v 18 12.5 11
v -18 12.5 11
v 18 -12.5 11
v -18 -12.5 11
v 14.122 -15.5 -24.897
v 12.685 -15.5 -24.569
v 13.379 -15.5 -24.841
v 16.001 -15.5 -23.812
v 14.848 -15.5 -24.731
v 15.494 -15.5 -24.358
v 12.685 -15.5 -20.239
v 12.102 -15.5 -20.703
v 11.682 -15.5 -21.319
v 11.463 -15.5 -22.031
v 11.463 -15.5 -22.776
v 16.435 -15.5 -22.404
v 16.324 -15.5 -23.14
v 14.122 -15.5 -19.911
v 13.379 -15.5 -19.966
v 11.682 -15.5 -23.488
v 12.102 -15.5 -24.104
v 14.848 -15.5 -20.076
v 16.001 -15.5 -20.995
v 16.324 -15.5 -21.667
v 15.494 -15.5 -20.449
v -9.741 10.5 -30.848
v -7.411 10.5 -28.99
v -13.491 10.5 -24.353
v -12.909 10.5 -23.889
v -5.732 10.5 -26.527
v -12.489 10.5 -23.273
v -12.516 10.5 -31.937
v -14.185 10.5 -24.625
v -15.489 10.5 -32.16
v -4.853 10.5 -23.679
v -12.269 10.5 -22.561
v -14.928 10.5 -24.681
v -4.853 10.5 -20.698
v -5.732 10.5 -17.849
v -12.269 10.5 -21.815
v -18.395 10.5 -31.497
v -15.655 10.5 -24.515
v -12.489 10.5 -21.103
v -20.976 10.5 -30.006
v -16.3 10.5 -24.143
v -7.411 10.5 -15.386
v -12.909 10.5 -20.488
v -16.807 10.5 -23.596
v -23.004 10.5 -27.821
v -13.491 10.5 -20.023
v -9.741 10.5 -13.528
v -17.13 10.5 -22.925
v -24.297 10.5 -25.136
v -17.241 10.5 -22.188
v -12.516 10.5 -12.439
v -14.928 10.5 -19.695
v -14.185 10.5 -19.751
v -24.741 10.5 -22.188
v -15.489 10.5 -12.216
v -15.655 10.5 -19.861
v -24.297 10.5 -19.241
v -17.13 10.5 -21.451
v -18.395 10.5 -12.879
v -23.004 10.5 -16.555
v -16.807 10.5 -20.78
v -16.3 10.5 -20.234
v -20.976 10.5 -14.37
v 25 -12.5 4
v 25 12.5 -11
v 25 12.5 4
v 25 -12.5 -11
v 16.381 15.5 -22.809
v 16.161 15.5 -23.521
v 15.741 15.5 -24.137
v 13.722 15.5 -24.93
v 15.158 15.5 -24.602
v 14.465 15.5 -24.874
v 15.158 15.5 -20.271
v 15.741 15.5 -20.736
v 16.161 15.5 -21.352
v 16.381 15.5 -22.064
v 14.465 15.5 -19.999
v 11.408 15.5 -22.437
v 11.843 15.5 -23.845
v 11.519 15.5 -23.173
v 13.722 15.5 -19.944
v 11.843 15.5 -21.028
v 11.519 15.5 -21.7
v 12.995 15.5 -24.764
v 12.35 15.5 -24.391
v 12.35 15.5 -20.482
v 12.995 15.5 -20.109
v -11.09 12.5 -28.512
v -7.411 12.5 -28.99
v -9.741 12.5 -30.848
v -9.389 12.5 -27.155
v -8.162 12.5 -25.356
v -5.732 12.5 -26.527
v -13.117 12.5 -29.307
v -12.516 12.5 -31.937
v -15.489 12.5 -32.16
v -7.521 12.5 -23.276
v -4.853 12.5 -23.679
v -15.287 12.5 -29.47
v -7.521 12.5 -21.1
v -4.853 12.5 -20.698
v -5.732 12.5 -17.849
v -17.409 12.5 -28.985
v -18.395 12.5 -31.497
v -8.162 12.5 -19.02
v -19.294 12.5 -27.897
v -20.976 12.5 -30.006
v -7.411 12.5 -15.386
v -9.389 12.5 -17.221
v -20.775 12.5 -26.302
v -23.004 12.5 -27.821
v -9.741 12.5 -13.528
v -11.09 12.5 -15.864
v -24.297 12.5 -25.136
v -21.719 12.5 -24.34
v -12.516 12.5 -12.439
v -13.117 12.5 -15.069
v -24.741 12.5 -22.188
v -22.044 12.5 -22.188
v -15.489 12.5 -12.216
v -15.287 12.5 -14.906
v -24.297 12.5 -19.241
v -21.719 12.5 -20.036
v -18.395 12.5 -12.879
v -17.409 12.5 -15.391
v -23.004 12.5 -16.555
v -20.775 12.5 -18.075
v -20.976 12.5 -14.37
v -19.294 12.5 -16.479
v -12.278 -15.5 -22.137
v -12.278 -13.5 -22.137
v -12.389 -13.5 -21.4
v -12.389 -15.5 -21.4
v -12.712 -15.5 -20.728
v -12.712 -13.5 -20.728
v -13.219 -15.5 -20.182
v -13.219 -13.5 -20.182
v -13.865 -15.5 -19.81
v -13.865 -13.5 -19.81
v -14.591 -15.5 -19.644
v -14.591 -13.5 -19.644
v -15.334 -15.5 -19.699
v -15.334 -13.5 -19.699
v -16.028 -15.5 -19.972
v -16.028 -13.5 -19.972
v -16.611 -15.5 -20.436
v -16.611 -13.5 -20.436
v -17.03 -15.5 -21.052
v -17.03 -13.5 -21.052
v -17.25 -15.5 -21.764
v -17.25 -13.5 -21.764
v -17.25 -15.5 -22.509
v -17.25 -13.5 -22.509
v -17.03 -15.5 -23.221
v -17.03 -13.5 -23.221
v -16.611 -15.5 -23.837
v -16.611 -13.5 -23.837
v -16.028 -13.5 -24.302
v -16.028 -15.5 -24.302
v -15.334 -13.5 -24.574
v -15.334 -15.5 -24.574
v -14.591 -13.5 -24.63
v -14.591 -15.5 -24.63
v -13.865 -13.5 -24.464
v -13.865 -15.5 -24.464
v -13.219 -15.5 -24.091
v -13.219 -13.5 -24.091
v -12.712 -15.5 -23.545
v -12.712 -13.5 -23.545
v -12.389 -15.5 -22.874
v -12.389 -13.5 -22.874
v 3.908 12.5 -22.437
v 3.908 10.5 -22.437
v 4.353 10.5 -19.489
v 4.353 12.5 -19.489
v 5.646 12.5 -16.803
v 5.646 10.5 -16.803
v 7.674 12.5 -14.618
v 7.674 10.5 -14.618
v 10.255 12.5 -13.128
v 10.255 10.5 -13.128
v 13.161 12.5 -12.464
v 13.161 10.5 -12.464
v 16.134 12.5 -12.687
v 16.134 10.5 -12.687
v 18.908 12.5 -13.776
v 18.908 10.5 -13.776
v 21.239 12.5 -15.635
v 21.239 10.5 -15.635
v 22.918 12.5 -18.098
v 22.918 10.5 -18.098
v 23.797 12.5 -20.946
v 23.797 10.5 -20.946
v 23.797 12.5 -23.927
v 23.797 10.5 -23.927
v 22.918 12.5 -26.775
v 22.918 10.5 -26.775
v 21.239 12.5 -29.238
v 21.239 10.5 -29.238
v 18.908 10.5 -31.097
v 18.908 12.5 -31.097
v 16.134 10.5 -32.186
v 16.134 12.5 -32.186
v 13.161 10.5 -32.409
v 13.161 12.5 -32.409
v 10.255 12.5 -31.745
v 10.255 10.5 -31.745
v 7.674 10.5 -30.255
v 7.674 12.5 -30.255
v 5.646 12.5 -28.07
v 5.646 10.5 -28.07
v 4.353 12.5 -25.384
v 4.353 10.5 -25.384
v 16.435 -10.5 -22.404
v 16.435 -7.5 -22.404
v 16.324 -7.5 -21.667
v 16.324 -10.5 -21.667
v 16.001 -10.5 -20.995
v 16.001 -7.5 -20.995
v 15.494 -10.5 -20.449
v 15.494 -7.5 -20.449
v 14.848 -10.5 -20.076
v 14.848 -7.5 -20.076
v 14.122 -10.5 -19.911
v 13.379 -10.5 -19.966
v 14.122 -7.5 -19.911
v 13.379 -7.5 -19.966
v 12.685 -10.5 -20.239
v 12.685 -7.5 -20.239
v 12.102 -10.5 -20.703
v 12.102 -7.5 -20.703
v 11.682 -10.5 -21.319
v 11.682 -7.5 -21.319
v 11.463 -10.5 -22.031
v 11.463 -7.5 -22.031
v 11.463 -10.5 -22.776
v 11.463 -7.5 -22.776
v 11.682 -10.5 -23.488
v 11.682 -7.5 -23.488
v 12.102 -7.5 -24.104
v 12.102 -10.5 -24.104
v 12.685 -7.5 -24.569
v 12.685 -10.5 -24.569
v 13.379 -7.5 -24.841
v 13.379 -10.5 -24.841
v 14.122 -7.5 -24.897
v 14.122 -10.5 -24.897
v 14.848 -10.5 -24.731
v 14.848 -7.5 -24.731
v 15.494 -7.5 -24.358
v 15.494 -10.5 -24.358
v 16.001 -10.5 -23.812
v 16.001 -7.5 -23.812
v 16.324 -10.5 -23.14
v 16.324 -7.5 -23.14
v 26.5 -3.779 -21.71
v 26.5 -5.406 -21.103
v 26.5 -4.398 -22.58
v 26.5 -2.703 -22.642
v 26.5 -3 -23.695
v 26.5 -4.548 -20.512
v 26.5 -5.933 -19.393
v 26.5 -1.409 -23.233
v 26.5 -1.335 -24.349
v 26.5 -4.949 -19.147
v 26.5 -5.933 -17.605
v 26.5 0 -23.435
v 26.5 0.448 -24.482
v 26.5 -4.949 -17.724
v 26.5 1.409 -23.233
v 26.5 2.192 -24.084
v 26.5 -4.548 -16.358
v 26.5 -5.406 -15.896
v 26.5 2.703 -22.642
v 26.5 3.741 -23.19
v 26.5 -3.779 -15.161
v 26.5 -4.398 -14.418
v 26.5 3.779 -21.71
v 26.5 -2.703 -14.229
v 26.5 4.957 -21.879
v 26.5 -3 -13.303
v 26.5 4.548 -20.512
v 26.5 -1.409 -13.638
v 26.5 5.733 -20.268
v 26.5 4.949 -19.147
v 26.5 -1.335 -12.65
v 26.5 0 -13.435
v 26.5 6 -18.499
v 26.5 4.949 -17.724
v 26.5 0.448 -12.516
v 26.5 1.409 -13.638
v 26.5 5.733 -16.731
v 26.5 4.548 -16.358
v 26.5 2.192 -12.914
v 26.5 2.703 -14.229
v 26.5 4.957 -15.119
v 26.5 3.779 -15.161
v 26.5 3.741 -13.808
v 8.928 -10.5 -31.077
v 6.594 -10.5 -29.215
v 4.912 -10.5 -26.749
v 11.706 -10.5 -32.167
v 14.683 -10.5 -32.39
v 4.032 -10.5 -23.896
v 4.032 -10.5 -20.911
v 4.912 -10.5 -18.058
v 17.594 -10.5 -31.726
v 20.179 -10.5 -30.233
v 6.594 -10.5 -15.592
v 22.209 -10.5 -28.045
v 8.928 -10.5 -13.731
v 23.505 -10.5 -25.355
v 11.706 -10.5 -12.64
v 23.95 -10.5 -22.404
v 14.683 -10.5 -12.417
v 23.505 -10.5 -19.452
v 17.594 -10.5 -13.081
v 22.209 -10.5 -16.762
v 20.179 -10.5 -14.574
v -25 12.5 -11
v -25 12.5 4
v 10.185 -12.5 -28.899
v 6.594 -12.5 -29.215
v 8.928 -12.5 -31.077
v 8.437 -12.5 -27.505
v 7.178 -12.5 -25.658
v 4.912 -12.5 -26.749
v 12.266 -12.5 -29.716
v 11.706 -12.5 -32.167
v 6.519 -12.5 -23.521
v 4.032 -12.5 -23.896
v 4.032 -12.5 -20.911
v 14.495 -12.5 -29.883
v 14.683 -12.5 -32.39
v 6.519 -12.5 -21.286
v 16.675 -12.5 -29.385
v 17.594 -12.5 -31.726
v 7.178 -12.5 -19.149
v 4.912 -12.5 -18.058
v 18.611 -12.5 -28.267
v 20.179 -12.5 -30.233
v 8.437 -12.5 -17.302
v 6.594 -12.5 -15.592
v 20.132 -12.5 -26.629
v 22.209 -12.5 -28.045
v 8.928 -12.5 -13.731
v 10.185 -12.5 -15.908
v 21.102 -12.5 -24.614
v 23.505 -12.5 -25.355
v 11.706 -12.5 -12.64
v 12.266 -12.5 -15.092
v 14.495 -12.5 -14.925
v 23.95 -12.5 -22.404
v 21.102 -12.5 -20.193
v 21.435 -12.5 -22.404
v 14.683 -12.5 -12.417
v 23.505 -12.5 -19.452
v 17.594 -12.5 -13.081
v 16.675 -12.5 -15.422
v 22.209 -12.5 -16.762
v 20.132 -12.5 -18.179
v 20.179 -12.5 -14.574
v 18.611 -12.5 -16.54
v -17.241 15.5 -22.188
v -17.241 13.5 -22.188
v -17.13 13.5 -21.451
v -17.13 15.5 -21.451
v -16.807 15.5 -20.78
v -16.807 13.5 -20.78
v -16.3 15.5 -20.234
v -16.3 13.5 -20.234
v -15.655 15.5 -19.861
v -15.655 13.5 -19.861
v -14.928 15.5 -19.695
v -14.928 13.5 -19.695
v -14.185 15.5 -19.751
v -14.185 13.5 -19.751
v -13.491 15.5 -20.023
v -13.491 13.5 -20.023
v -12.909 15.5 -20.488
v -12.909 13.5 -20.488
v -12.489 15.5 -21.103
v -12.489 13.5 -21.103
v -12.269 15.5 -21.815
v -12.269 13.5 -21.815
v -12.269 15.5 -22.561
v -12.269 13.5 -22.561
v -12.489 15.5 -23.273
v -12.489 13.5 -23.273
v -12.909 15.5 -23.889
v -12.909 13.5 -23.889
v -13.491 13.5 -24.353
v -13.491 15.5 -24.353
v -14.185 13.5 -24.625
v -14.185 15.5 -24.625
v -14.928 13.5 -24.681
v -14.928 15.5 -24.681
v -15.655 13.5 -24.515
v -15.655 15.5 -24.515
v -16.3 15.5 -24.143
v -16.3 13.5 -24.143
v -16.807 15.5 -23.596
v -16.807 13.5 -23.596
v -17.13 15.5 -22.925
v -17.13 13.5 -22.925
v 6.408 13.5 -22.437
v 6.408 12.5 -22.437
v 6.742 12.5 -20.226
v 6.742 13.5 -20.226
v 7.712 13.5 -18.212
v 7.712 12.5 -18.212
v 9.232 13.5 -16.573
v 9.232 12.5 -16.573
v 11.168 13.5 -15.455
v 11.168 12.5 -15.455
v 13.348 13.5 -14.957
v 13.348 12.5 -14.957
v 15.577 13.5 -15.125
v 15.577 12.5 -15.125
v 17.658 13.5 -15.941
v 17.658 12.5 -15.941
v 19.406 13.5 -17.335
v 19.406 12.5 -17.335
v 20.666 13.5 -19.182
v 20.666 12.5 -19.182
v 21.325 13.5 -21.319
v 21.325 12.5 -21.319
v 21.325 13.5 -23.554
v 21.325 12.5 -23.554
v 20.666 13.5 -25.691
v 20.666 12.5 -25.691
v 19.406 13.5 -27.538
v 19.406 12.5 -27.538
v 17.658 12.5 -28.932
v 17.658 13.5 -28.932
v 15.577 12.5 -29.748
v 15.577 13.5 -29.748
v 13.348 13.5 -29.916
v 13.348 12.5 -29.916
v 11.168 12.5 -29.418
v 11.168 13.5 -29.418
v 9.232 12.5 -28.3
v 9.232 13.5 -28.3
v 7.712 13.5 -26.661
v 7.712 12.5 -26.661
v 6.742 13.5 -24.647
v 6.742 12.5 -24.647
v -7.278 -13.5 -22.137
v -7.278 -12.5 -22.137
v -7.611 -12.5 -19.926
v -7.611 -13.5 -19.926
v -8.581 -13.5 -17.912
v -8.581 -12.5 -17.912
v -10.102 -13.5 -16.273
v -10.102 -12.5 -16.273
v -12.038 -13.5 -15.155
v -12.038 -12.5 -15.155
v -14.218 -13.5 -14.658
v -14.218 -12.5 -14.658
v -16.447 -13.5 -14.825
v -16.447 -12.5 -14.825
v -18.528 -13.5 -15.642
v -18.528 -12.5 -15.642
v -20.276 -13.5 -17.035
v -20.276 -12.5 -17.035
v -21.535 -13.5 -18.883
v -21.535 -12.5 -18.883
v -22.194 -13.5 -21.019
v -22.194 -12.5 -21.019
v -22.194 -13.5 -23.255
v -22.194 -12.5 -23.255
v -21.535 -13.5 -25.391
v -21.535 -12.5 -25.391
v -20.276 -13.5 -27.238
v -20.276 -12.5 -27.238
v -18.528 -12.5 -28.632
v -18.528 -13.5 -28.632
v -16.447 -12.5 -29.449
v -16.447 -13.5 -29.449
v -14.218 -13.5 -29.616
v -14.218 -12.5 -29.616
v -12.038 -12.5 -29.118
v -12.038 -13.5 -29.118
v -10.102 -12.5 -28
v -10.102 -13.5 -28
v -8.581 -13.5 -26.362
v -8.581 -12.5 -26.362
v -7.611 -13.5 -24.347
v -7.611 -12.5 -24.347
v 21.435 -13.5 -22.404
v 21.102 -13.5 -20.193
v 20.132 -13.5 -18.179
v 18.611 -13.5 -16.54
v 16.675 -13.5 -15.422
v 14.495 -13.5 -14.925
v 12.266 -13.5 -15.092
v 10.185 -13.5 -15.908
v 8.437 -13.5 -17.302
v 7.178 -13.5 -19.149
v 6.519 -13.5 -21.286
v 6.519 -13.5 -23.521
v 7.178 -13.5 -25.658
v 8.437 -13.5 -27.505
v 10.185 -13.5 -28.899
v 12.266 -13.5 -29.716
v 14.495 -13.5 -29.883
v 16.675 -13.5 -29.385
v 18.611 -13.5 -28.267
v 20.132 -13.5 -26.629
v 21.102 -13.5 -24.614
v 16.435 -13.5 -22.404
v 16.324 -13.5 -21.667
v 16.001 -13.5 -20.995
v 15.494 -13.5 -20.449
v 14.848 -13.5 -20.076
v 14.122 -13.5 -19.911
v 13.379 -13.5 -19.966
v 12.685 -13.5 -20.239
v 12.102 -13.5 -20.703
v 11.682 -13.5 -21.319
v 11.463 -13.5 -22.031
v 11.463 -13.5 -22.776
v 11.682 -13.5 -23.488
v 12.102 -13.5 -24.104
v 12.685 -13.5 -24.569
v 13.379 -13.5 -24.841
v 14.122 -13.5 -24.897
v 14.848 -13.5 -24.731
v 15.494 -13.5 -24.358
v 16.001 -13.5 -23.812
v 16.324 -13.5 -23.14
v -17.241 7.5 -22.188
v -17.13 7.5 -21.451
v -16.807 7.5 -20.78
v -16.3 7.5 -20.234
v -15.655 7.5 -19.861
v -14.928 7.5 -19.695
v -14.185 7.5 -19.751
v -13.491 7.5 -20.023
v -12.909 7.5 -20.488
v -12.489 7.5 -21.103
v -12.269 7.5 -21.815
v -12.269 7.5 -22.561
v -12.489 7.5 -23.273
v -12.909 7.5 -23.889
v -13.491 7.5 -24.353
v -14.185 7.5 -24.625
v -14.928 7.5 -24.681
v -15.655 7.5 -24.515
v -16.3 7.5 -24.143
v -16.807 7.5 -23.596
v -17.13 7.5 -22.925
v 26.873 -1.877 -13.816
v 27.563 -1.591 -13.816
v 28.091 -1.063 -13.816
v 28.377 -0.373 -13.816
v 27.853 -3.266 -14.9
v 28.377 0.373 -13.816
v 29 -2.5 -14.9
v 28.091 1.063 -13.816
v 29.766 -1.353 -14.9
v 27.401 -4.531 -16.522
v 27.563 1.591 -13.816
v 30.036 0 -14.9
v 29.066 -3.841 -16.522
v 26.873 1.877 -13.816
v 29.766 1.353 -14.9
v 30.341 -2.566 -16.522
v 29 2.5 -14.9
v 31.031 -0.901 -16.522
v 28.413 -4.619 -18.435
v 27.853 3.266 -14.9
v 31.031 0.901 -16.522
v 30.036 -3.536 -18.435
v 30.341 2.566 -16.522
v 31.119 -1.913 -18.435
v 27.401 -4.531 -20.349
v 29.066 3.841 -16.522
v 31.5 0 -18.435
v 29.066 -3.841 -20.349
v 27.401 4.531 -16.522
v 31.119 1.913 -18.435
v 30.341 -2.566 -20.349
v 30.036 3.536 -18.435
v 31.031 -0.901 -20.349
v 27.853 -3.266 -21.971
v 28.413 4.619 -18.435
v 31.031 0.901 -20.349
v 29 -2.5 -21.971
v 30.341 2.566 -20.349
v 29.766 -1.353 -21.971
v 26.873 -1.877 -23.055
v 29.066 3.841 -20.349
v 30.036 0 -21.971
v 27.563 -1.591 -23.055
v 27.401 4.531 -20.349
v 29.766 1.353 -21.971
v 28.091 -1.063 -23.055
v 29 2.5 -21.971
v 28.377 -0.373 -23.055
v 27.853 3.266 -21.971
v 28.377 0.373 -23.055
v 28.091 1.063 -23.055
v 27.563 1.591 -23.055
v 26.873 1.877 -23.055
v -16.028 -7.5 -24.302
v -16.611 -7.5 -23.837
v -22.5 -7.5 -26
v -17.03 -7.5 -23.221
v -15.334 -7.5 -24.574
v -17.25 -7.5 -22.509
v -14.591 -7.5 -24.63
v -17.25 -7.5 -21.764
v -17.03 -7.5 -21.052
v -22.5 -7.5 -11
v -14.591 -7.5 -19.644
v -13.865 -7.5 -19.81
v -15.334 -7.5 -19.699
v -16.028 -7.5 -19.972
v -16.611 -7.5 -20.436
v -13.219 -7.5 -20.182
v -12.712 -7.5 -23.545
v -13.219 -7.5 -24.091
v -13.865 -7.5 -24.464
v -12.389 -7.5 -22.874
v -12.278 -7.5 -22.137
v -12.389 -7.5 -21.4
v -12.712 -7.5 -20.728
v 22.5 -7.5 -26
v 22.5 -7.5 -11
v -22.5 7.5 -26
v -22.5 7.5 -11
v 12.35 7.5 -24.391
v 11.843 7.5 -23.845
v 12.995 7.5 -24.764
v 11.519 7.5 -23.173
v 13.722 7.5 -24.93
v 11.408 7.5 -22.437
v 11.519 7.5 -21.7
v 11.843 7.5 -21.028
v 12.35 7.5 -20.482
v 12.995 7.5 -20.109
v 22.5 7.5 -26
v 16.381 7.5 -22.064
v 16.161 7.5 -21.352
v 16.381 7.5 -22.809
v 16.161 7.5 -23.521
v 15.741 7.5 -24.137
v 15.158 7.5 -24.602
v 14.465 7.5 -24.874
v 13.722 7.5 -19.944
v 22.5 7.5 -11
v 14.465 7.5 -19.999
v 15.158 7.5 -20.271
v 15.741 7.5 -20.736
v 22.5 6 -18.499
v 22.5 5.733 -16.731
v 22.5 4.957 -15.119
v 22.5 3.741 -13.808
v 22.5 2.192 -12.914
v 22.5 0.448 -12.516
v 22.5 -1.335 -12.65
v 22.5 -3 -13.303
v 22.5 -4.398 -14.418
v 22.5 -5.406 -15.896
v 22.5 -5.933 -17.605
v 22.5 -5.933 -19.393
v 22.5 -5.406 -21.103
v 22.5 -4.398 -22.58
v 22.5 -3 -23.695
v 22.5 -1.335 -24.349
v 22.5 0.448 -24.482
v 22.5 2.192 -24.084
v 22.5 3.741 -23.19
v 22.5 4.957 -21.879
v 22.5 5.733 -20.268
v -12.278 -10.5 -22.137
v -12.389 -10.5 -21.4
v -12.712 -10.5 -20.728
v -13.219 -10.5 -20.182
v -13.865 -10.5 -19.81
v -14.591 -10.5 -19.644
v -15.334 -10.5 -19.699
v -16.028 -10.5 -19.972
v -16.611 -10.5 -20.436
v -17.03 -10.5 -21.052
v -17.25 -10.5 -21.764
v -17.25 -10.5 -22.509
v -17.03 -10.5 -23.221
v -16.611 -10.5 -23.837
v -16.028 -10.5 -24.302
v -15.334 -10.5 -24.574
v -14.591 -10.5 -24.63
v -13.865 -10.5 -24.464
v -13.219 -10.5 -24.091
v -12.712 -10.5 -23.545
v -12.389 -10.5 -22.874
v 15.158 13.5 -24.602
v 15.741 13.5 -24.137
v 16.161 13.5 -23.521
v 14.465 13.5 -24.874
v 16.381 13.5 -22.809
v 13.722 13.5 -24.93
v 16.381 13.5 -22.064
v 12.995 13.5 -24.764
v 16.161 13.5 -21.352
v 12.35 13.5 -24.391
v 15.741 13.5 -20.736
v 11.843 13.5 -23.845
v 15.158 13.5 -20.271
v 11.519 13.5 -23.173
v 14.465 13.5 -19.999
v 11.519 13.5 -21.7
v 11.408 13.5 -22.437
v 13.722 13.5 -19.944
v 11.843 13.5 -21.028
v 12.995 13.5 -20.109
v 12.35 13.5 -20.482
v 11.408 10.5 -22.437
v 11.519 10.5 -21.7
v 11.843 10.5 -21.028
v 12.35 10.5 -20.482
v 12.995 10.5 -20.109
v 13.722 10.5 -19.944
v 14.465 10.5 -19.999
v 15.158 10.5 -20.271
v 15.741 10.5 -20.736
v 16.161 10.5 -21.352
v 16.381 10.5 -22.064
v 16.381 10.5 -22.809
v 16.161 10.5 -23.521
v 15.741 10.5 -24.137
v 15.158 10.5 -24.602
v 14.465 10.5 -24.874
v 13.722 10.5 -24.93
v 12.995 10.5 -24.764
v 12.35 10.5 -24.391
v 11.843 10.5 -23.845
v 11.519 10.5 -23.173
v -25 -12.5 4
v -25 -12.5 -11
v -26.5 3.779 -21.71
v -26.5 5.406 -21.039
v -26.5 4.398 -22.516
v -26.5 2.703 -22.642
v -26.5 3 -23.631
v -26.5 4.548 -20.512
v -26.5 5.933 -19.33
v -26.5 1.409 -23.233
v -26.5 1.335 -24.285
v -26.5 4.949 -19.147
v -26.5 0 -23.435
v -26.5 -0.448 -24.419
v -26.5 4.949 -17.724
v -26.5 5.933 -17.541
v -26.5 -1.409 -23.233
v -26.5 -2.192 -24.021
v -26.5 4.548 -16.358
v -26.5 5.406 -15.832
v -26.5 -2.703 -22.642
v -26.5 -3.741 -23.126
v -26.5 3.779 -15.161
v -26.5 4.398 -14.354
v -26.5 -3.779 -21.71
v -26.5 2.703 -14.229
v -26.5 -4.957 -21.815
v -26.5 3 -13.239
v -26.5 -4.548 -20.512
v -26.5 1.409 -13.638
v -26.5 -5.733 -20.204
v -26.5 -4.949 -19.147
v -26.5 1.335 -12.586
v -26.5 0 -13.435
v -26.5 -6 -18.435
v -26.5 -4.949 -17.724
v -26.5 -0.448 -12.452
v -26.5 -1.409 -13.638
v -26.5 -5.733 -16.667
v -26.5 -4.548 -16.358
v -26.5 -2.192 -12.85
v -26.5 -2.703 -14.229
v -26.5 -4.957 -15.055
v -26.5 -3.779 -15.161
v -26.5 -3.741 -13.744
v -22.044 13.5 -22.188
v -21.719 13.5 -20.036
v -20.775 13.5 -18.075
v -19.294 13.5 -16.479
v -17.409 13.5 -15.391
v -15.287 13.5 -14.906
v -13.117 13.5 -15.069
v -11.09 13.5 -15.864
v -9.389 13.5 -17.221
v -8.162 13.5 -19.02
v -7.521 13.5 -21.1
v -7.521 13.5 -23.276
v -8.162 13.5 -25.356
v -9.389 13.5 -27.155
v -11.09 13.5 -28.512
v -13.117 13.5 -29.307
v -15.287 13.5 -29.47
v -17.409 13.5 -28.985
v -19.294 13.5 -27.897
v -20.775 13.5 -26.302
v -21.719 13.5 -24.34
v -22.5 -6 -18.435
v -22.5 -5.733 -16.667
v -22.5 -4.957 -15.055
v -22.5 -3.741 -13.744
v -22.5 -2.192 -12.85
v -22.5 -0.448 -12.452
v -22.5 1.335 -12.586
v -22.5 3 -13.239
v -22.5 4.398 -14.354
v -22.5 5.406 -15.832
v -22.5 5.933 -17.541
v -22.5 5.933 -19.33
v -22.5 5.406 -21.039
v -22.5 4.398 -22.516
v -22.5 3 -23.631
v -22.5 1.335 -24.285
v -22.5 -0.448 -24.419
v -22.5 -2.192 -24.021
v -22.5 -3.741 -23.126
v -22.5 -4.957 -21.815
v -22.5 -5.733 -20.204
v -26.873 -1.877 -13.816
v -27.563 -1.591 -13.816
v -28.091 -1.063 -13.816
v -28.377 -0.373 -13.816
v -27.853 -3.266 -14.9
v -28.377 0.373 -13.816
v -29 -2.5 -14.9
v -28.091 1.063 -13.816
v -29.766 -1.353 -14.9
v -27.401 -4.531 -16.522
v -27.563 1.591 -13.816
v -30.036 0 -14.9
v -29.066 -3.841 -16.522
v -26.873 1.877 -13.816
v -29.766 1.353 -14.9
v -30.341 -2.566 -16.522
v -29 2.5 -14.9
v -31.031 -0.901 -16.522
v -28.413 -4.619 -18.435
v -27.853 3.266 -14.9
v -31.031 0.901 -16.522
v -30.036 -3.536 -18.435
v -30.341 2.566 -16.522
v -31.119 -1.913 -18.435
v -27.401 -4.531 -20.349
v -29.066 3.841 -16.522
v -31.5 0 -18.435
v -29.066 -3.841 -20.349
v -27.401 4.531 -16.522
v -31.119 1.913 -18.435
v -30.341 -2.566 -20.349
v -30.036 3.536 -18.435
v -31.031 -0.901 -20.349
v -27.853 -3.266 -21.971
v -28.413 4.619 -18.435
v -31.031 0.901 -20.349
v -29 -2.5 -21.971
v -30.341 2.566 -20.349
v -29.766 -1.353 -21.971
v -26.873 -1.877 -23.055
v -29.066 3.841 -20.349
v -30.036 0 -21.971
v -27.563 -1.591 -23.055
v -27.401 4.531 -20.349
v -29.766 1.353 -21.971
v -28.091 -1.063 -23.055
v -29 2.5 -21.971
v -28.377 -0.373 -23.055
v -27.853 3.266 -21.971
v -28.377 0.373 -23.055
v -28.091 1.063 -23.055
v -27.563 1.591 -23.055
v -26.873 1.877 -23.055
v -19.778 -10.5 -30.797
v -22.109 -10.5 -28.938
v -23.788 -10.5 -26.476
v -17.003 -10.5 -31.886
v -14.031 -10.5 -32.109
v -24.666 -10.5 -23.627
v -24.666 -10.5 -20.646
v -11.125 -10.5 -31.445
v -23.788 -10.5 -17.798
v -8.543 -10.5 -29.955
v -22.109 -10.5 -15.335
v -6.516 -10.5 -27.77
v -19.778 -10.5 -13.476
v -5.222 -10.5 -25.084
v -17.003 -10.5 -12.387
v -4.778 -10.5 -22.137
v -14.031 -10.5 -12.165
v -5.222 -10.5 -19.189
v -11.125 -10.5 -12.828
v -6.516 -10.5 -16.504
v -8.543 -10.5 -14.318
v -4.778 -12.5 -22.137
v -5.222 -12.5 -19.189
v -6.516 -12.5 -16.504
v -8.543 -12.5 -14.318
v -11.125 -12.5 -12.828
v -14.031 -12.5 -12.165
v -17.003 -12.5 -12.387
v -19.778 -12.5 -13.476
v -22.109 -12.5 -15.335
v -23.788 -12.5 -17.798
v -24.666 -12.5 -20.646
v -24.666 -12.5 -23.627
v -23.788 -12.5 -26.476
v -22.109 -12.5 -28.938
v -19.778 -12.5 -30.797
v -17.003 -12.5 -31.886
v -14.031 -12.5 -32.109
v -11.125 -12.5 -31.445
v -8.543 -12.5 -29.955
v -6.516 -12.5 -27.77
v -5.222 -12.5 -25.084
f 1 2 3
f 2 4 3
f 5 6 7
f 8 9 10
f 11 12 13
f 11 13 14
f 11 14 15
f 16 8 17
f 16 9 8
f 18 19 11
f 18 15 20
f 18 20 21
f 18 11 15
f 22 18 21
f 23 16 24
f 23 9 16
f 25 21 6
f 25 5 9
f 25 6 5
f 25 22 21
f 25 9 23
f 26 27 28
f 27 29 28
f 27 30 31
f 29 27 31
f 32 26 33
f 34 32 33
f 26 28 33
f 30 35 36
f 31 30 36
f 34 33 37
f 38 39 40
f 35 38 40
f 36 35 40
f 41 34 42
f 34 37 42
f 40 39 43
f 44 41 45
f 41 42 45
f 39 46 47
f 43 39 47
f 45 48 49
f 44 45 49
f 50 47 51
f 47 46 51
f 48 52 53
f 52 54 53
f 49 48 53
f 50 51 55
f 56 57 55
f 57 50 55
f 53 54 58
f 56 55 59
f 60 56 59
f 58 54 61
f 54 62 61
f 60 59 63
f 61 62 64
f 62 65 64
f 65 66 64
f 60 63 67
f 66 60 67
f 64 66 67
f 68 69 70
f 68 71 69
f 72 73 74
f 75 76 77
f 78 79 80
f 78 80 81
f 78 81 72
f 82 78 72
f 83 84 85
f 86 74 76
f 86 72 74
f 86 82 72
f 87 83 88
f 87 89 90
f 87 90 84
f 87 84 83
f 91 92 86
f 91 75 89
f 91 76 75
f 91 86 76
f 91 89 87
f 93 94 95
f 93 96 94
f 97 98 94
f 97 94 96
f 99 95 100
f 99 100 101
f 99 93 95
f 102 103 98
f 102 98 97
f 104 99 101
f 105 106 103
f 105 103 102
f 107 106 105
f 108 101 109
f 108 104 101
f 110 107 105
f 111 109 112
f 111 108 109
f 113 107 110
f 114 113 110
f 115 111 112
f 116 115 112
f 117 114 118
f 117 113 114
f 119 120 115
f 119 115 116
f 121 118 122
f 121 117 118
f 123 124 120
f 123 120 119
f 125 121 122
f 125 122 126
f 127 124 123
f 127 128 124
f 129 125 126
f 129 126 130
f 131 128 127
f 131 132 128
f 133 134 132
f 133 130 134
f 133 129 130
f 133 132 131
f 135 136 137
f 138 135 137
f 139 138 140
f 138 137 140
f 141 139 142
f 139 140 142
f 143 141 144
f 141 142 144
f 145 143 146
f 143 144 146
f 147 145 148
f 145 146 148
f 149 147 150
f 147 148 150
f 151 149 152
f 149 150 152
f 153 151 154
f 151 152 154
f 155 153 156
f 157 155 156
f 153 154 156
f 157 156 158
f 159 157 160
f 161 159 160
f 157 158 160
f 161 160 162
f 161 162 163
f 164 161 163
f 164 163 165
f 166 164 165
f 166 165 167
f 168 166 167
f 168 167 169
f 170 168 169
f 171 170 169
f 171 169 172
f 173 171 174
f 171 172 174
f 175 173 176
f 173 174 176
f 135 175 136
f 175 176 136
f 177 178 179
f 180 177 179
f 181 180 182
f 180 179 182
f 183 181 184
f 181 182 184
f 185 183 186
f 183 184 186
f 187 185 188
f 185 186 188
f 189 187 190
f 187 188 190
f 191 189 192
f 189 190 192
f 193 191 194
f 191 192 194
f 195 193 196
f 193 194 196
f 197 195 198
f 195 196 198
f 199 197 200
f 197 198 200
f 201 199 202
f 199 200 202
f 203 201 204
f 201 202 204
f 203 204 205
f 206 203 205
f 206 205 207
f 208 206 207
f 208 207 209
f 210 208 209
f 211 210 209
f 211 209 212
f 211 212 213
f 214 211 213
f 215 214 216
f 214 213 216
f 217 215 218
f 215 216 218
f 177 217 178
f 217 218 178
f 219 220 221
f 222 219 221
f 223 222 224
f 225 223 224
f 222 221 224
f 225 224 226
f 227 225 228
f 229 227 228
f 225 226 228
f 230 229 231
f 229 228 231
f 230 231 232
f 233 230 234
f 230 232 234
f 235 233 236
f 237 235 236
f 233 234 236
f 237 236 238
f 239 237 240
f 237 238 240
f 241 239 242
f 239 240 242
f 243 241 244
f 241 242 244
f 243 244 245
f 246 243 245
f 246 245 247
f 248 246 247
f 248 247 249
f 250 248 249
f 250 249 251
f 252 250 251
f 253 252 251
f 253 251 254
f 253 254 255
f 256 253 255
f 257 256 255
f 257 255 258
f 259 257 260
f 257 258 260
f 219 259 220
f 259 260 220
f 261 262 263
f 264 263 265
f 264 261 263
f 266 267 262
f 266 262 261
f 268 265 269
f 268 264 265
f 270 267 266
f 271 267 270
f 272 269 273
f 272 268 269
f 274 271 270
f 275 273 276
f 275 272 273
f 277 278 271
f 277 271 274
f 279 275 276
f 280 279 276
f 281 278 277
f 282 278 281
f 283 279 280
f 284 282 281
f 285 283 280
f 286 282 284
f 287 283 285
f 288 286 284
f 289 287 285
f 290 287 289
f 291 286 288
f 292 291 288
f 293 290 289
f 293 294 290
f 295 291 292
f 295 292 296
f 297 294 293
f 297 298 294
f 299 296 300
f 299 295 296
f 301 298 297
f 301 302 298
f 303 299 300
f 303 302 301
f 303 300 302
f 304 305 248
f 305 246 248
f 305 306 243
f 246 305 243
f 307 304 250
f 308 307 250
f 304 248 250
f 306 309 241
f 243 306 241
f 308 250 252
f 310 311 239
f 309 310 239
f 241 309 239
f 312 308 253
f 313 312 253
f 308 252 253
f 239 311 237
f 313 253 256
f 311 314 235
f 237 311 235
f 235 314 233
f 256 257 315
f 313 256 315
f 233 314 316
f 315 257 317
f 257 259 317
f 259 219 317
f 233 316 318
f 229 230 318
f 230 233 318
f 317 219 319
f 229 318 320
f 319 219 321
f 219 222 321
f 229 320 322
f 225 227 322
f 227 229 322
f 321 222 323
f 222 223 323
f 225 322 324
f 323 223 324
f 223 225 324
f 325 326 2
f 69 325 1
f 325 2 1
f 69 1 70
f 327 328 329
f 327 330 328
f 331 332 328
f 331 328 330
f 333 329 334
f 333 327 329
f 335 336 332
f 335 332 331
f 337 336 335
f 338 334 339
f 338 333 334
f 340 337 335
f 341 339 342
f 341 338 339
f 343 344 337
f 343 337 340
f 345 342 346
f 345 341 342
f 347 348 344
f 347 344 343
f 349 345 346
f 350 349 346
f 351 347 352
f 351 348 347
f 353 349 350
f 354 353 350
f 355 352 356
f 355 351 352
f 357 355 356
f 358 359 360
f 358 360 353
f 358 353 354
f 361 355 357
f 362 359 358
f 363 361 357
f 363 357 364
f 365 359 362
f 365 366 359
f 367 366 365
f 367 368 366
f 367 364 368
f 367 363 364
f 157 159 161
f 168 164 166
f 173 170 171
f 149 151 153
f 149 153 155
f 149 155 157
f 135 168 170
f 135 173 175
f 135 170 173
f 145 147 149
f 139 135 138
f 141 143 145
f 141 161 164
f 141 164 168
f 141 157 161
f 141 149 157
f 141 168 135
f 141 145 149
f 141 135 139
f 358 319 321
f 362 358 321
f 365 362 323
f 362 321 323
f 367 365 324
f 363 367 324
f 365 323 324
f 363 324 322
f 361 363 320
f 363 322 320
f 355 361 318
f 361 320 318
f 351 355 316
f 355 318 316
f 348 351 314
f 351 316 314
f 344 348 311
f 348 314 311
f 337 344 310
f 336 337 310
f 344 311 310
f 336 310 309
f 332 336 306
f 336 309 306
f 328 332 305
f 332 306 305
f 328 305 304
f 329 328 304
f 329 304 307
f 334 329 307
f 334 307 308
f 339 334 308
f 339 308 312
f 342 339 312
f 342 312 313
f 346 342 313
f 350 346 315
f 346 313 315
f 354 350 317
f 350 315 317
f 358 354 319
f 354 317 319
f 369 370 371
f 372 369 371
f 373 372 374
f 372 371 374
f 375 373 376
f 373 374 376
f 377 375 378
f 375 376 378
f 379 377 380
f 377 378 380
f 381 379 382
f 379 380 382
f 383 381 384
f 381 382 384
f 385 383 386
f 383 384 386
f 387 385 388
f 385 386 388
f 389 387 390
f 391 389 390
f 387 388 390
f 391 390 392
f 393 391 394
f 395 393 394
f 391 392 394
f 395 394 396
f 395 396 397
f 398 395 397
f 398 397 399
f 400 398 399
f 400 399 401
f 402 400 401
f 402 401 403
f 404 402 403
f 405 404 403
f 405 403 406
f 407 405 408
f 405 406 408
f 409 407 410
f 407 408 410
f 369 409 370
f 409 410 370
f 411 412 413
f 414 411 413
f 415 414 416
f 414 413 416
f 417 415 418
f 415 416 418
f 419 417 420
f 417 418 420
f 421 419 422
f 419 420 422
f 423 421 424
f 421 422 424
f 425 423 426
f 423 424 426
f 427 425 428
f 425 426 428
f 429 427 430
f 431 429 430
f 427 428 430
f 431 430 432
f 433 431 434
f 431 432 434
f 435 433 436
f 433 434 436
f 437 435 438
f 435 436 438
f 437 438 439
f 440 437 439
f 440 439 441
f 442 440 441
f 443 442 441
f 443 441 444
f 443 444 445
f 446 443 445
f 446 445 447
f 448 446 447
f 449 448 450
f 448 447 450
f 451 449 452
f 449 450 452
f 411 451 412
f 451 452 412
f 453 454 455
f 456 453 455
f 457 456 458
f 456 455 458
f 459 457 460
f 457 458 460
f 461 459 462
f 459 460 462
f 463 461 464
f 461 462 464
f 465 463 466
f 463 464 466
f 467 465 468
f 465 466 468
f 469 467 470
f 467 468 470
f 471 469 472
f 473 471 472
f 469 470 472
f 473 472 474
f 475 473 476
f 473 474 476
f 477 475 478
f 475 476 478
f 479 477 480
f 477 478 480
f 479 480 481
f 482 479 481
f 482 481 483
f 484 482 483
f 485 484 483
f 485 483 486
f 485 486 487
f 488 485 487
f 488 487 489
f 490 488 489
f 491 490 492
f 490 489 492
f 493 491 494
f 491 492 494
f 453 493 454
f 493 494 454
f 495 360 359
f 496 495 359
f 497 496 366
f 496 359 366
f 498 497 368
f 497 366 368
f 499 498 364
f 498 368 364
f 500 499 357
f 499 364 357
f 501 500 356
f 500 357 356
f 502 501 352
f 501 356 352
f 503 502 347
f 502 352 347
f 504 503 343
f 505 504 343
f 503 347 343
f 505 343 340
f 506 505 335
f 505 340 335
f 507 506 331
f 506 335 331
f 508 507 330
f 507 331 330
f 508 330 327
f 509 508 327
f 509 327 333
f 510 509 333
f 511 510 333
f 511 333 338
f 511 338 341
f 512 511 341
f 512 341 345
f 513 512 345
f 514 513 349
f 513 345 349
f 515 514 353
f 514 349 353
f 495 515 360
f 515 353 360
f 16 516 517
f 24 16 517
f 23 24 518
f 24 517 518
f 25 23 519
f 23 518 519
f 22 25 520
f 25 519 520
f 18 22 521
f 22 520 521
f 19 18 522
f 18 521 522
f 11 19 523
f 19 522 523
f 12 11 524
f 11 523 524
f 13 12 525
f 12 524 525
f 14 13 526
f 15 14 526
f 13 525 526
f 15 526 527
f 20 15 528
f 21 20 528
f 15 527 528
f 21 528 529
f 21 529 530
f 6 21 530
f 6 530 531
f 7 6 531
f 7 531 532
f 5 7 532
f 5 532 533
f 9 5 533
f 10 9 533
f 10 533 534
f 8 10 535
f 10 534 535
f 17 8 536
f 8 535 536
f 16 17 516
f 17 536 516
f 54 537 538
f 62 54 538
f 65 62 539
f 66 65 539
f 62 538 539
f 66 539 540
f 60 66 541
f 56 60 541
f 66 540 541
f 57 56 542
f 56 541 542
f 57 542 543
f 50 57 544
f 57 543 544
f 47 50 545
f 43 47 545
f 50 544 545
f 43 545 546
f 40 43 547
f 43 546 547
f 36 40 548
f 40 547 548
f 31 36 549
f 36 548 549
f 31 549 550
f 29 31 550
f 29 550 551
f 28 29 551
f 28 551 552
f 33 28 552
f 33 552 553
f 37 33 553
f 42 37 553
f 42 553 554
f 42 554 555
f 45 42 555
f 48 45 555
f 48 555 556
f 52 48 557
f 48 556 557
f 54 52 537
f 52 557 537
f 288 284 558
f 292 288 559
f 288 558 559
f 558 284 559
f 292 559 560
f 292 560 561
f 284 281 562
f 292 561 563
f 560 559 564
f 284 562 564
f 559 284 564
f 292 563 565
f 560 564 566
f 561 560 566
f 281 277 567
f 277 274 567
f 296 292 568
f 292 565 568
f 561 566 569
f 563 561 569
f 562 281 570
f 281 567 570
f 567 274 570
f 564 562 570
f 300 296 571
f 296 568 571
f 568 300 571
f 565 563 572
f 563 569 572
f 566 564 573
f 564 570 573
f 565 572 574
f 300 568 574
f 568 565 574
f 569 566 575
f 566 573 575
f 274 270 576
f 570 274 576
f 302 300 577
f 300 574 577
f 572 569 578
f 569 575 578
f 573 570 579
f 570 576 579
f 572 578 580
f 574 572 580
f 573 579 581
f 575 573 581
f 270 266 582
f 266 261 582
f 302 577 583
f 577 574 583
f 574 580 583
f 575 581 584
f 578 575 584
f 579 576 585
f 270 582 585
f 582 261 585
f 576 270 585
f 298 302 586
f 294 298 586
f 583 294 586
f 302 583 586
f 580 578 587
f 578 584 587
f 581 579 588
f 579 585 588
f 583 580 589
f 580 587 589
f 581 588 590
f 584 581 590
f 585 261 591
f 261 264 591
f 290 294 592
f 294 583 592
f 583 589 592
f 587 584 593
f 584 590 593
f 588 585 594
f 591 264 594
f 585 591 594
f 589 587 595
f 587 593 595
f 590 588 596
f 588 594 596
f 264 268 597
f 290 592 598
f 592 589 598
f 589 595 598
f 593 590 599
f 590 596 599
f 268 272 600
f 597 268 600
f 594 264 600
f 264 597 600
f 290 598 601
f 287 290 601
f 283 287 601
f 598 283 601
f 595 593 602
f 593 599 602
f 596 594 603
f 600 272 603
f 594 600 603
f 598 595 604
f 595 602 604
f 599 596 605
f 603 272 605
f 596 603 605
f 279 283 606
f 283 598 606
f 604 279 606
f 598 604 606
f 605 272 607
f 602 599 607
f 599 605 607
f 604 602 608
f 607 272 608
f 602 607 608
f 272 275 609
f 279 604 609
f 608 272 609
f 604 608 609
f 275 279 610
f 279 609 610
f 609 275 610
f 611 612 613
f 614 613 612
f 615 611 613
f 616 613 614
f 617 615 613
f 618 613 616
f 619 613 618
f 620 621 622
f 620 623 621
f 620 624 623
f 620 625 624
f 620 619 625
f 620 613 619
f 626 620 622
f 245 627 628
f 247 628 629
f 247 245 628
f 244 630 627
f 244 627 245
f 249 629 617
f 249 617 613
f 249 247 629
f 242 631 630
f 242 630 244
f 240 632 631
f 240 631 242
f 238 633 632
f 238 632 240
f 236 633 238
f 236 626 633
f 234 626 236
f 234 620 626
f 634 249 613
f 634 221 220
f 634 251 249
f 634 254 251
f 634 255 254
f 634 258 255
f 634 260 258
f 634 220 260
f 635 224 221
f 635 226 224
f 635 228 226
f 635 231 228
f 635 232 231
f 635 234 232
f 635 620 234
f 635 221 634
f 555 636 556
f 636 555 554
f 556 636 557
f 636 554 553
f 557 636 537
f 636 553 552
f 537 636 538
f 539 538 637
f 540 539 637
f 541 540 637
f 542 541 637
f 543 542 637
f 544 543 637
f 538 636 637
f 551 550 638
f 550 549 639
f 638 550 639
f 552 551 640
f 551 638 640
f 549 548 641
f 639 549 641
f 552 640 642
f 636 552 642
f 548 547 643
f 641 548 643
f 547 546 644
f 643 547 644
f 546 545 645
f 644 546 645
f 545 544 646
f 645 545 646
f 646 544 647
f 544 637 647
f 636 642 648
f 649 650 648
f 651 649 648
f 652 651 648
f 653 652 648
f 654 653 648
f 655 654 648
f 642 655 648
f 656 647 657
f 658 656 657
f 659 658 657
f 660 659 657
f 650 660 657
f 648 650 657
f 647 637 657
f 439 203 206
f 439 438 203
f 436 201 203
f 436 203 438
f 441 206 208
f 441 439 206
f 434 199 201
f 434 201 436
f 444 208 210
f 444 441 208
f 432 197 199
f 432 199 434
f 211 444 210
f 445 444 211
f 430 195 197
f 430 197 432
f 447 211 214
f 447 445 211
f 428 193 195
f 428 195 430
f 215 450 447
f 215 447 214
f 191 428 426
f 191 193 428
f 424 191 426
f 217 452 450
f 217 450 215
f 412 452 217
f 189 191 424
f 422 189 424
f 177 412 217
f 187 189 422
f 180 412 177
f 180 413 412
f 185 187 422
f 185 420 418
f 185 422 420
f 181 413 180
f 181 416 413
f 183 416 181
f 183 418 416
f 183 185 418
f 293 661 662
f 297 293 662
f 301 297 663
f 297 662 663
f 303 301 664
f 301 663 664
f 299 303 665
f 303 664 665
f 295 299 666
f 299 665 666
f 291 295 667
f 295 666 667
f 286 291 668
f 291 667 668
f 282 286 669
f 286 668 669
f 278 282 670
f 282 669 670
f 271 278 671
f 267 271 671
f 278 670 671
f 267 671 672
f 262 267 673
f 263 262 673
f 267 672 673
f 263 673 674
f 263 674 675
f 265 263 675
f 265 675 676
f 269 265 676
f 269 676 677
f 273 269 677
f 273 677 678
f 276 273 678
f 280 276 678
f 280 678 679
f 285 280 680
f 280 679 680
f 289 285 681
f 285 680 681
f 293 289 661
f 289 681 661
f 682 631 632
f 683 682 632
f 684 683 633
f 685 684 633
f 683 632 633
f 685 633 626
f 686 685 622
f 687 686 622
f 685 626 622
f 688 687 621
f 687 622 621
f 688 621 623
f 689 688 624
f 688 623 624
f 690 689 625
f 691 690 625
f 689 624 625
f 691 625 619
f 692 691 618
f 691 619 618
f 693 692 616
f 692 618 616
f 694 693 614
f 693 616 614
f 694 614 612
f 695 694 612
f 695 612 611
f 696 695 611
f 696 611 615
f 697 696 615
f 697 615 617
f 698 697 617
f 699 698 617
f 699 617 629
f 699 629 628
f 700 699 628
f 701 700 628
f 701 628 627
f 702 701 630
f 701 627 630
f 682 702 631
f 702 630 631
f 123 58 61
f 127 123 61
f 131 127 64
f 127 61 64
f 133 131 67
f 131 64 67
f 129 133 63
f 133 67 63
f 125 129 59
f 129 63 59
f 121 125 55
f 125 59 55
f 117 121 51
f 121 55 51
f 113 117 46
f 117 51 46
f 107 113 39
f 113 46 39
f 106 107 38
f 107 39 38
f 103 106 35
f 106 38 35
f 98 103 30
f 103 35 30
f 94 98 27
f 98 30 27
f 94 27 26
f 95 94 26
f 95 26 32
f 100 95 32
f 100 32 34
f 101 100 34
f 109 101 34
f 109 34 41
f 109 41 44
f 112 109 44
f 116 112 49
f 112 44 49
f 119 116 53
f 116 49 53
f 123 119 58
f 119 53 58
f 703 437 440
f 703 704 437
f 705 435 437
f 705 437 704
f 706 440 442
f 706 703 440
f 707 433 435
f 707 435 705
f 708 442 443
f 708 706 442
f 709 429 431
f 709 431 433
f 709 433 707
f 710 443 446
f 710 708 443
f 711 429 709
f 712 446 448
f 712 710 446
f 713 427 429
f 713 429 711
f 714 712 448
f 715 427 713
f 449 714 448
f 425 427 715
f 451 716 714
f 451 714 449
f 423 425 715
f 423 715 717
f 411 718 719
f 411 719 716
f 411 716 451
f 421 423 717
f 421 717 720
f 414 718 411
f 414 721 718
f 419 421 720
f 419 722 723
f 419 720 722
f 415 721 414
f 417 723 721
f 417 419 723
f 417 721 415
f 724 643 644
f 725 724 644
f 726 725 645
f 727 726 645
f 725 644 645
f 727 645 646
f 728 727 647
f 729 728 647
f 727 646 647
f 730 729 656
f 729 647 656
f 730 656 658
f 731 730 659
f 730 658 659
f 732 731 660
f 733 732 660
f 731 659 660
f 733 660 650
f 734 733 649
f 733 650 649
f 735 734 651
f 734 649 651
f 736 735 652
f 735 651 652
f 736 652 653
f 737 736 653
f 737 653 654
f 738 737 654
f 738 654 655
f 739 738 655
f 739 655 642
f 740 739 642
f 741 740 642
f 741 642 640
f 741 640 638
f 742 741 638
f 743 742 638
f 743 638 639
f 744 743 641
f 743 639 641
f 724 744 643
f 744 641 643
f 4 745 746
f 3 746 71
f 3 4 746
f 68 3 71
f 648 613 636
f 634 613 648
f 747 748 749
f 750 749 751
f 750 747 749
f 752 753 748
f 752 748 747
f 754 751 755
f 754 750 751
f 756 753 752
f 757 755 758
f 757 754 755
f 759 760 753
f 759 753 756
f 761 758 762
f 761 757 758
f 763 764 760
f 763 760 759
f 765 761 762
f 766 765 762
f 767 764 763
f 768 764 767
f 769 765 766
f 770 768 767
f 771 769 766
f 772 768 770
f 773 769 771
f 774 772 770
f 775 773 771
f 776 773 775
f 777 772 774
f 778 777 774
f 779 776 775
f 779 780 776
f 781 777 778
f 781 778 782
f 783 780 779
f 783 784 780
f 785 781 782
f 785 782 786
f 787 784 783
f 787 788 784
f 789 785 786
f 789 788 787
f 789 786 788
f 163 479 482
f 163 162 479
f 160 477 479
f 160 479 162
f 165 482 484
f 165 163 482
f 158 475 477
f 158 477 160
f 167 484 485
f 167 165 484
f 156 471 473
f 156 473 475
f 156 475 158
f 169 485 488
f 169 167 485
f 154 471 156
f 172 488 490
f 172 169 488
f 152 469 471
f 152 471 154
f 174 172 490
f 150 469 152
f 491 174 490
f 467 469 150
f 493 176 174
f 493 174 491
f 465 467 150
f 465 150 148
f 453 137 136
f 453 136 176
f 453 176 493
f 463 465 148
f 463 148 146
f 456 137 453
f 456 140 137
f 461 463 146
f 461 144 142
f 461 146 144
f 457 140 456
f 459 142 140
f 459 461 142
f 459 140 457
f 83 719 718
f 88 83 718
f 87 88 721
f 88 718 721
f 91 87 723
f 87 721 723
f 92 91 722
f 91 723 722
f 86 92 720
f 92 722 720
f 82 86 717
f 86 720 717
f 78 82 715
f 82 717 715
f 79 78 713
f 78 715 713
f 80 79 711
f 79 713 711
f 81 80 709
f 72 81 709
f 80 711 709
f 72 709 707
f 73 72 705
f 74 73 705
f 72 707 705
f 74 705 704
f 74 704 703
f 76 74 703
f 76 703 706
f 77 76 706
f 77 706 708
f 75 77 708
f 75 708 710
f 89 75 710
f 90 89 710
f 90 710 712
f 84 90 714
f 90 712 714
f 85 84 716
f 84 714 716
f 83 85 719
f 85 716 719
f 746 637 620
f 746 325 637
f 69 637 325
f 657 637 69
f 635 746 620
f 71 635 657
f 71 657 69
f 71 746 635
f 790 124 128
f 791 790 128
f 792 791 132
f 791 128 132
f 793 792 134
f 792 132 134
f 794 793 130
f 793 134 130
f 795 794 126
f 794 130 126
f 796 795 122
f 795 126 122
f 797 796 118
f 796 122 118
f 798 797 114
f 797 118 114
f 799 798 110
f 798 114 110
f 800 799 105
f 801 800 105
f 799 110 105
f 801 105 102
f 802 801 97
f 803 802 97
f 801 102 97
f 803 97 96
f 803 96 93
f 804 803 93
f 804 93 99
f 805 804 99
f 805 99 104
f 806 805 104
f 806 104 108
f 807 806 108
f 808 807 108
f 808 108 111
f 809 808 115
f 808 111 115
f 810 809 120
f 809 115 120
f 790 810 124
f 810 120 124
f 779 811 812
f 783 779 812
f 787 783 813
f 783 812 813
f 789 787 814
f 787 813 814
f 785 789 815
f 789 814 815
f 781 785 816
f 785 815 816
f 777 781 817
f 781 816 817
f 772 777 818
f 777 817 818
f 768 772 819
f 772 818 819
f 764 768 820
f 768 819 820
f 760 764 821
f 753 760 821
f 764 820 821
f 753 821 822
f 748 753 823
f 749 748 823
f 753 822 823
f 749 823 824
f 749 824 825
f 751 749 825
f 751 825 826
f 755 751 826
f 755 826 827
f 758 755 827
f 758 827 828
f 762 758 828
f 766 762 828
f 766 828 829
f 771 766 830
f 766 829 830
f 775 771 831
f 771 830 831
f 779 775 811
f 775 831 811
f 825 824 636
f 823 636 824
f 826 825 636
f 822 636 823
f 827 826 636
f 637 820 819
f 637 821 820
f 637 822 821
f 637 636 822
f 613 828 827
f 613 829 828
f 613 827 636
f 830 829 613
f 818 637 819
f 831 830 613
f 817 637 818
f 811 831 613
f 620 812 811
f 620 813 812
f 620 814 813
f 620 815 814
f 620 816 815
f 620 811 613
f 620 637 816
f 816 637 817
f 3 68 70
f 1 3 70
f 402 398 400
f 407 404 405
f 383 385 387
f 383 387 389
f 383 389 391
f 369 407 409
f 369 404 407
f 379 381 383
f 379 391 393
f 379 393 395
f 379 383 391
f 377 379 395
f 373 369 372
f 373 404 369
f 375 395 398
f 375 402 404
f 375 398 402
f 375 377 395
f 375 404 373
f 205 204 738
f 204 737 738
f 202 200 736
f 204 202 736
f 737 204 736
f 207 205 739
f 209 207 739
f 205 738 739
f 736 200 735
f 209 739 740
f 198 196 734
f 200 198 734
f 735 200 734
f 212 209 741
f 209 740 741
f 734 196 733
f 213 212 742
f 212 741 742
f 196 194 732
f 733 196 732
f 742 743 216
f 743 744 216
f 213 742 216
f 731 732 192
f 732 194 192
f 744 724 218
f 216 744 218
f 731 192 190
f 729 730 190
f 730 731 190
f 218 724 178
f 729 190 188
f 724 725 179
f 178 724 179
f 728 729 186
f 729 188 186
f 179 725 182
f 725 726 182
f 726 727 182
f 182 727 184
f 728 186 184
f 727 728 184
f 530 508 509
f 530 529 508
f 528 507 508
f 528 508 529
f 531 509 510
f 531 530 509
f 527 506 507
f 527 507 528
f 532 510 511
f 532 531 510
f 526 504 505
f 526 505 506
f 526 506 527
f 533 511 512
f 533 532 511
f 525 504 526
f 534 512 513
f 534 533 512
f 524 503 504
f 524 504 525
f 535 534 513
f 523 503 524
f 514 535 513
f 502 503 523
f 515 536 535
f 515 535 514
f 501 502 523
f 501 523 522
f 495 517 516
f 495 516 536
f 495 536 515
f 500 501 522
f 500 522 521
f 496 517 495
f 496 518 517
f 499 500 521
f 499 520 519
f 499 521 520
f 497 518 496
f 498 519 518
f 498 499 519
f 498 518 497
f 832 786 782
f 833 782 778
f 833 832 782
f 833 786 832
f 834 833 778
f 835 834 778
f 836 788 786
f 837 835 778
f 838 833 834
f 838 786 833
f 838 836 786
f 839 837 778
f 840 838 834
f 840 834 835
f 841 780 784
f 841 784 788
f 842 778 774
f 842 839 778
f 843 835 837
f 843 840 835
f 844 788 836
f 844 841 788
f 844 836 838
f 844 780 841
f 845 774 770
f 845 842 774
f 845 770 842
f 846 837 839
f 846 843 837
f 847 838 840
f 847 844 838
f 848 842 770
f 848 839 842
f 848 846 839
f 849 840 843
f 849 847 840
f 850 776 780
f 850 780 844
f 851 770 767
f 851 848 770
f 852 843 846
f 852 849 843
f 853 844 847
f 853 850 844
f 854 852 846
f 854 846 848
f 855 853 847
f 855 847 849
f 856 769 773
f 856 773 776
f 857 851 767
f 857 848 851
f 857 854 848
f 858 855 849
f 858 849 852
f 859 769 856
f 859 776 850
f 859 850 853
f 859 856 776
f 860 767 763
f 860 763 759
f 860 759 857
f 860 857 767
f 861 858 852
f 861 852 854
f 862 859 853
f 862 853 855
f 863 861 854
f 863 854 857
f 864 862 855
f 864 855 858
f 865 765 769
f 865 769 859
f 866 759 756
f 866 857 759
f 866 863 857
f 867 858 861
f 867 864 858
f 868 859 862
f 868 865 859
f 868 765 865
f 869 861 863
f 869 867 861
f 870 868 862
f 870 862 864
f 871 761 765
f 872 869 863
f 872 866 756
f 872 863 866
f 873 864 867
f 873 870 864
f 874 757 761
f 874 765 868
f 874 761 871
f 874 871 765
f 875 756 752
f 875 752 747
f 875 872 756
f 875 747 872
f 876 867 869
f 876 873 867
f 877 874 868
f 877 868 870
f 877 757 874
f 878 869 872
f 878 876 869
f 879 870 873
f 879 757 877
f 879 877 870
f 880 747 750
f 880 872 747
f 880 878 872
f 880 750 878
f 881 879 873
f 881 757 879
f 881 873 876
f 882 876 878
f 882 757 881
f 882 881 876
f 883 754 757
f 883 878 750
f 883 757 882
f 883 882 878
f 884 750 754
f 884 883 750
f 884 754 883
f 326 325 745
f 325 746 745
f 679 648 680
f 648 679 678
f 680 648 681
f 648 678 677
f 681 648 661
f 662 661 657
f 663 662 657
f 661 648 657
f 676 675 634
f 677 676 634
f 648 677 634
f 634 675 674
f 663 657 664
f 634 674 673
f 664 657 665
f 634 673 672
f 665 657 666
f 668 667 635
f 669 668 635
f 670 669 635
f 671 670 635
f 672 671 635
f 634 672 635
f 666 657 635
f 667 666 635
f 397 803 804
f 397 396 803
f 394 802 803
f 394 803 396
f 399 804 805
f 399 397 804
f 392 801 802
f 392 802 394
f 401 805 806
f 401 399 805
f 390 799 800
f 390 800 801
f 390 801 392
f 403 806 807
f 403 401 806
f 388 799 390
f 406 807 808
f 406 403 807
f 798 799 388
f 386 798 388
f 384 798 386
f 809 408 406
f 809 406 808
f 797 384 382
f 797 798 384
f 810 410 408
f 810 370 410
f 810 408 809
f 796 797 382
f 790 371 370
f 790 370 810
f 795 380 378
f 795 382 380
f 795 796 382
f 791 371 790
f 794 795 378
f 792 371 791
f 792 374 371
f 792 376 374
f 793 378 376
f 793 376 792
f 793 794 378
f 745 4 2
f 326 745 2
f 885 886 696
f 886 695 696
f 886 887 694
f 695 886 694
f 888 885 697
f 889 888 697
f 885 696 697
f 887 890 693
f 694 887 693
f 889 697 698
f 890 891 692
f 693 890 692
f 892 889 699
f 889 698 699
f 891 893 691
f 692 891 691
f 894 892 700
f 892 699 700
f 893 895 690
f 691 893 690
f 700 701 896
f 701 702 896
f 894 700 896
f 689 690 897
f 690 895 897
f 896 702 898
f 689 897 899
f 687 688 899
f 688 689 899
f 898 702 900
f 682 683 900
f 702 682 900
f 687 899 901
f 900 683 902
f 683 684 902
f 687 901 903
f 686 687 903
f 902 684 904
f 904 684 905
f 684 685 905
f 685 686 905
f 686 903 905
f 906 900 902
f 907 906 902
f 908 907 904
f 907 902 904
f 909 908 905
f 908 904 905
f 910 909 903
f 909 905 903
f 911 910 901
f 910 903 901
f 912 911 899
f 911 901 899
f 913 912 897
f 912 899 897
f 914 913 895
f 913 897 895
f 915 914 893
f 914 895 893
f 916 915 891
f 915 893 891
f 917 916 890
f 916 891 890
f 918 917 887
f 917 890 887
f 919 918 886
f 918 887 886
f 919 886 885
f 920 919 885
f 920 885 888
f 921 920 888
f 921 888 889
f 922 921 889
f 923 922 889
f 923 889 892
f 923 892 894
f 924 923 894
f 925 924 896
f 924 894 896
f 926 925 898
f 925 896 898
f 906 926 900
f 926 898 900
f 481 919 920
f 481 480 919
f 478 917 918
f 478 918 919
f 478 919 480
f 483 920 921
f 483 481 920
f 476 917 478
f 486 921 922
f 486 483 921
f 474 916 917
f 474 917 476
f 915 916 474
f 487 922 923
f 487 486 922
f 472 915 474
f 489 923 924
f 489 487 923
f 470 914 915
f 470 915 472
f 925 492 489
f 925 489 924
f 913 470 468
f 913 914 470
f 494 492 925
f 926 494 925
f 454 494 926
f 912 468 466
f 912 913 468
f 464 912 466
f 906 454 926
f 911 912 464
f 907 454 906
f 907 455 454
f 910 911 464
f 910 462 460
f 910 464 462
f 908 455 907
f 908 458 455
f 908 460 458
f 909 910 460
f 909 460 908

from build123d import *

# Parameters (mm, degrees)
F0_W      = 50
F0_H      = 22
F1_DEPTH  = 12.5
F2_W      = 45
F2_H      = 15
F3_DEPTH  = 15
F4_R      = 2.5
F5_DEPTH  = 3
F6_R      = 2.5
F7_DEPTH  = 3
F8_R      = 2.5
F9_DEPTH  = 3
F10_R     = 2.5
F11_DEPTH = 3
F12_R     = 10
F13_DEPTH = 2
F14_R     = 10
F15_DEPTH = 2
F16_R     = 10
F17_DEPTH = 2
F18_R     = 10.0146932226
F19_DEPTH = 2
F20_R     = 7.5
F21_DEPTH = 1
F22_R     = 7.5
F23_DEPTH = 1
F24_R     = 7.5
F25_DEPTH = 1
F26_R     = 7.3021705666
F27_DEPTH = 1
F28_R     = 2.5
F29_DEPTH = 2
F30_R     = 2.5
F31_DEPTH = 2
F32_R     = 2.5
F33_DEPTH = 2
F34_R     = 2.5
F35_DEPTH = 2
F36_R     = 6
F37_DEPTH = 4
F38_R     = 6
F39_DEPTH = 4
F42_SIZE  = 7
F43_SIZE  = 7


# Not quite as in the source:
# - a pattern or mirror of a feature is missing from the dataset's text; its kind, count and spacing are read off the source's solid


with BuildPart() as f1:
    # F0 (on Front) → F1 (new body, symmetric)
    with BuildSketch(Plane.XZ):
        Rectangle(F0_W, F0_H)
    extrude(amount=F1_DEPTH, both=True)

    # F2 (on face) → F3 (join)
    with BuildSketch(Plane(origin=(0, 0, -11), x_dir=(1, 0, 0), z_dir=(0, 0, -1))):
        Rectangle(F2_W, F2_H)
    extrude(amount=F3_DEPTH)

    # F4 (on face) → F5 (join)
    with BuildSketch(Plane.XZ.offset(7.5)):
        with Locations((13.9349065721, -22.4036108702)):
            Circle(F4_R)
    extrude(amount=F5_DEPTH)

    # F6 (on face) → F7 (join)
    with BuildSketch(Plane.XZ.offset(7.5)):
        with Locations((-14.7780319676, -22.1367031336)):
            Circle(F6_R)
    extrude(amount=F7_DEPTH)

    # F8 (on face) → F9 (join)
    with BuildSketch(Plane(origin=(0, 7.5, 0), x_dir=(-1, 0, 0), z_dir=(0, 1, 0))):
        with Locations((14.7414254025, -22.1880879253)):
            Circle(F8_R)
    extrude(amount=F9_DEPTH)

    # F10 (on face) → F11 (join)
    with BuildSketch(Plane(origin=(0, 7.5, 0), x_dir=(-1, 0, 0), z_dir=(0, 1, 0))):
        with Locations((-13.9084318653, -22.4365219474)):
            Circle(F10_R)
    extrude(amount=F11_DEPTH)

    # F12 (on face) → F13 (join)
    with BuildSketch(Plane(origin=(0, 10.5, 0), x_dir=(-1, 0, 0), z_dir=(0, 1, 0))):
        with Locations((-13.9084318653, -22.4365219474)):
            Circle(F12_R)
    extrude(amount=F13_DEPTH)

    # F14 (on face) → F15 (join)
    with BuildSketch(Plane(origin=(0, 10.5, 0), x_dir=(-1, 0, 0), z_dir=(0, 1, 0))):
        with Locations((14.7414254025, -22.1880879253)):
            Circle(F14_R)
    extrude(amount=F15_DEPTH)

    # F16 (on face) → F17 (join)
    with BuildSketch(Plane.XZ.offset(10.5)):
        with Locations((-14.7780319676, -22.1367031336)):
            Circle(F16_R)
    extrude(amount=F17_DEPTH)

    # F18 (on face) → F19 (join)
    with BuildSketch(Plane.XZ.offset(10.5)):
        with Locations((13.9349065721, -22.4036108702)):
            Circle(F18_R)
    extrude(amount=F19_DEPTH)

    # F20 (on face) → F21 (join)
    with BuildSketch(Plane.XZ.offset(12.5)):
        with Locations((-14.7780319676, -22.1367031336)):
            Circle(F20_R)
    extrude(amount=F21_DEPTH)

    # F22 (on face) → F23 (join)
    with BuildSketch(Plane.XZ.offset(12.5)):
        with Locations((13.9349065721, -22.4036108702)):
            Circle(F22_R)
    extrude(amount=F23_DEPTH)

    # F24 (on face) → F25 (join)
    with BuildSketch(Plane(origin=(0, 12.5, 0), x_dir=(-1, 0, 0), z_dir=(0, 1, 0))):
        with Locations((-13.9084318653, -22.4365219474)):
            Circle(F24_R)
    extrude(amount=F25_DEPTH)

    # F26 (on face) → F27 (join)
    with BuildSketch(Plane(origin=(0, 12.5, 0), x_dir=(-1, 0, 0), z_dir=(0, 1, 0))):
        with Locations((14.7414254025, -22.1880879253)):
            Circle(F26_R)
    extrude(amount=F27_DEPTH)

    # F28 (on face) → F29 (join)
    with BuildSketch(Plane(origin=(0, 13.5, 0), x_dir=(-1, 0, 0), z_dir=(0, 1, 0))):
        with Locations((-13.9084318653, -22.4365219474)):
            Circle(F28_R)
    extrude(amount=F29_DEPTH)

    # F30 (on face) → F31 (join)
    with BuildSketch(Plane(origin=(0, 13.5, 0), x_dir=(-1, 0, 0), z_dir=(0, 1, 0))):
        with Locations((14.7414254025, -22.1880879253)):
            Circle(F30_R)
    extrude(amount=F31_DEPTH)

    # F32 (on face) → F33 (join)
    with BuildSketch(Plane.XZ.offset(13.5)):
        with Locations((-14.7780319676, -22.1367031336)):
            Circle(F32_R)
    extrude(amount=F33_DEPTH)

    # F34 (on face) → F35 (join)
    with BuildSketch(Plane.XZ.offset(13.5)):
        with Locations((13.9349065721, -22.4036108702)):
            Circle(F34_R)
    extrude(amount=F35_DEPTH)

    # F36 (on face) → F37 (join)
    with BuildSketch(Plane(origin=(-22.5, 0, 0), x_dir=(0, -1, 0), z_dir=(-1, 0, 0))):
        with Locations((0, -18.4352861294)):
            Circle(F36_R)
    extrude(amount=F37_DEPTH)

    # F38 (on face) → F39 (join)
    with BuildSketch(Plane.YZ.offset(22.5)):
        with Locations((0, -18.4992050543)):
            Circle(F38_R)
    extrude(amount=F39_DEPTH)

    # F40 (on face) → F41 (revolve)
    with BuildSketch(Plane(origin=(-26.5, 0, 0), x_dir=(0, -1, 0), z_dir=(-1, 0, 0))):
        with BuildLine():
            Line((0, -23.4352861294), (0, -13.4352861294))
            ThreePointArc((0, -13.4352861294), (-5, -18.4352861294), (0, -23.4352861294))
        make_face()
    f41 = revolve(axis=Axis((-26.5, 0, -18.4352861294), (0, 0, -1)))

    # F41_copies: F41 across plane
    add(f41.mirror(Plane(origin=(0, 0, 0), x_dir=(0, 0, 1), z_dir=(1, 0, 0))))

    # F42
    f42_edges = [f1.edges().sort_by_distance(p)[0] for p in [
        (-25, 0, 11),
    ]]
    chamfer(f42_edges, length=F42_SIZE)

    # F43
    f43_edges = [f1.edges().sort_by_distance(p)[0] for p in [
        (25, 0, 11),
    ]]
    chamfer(f43_edges, length=F43_SIZE)


solid = f1.part
